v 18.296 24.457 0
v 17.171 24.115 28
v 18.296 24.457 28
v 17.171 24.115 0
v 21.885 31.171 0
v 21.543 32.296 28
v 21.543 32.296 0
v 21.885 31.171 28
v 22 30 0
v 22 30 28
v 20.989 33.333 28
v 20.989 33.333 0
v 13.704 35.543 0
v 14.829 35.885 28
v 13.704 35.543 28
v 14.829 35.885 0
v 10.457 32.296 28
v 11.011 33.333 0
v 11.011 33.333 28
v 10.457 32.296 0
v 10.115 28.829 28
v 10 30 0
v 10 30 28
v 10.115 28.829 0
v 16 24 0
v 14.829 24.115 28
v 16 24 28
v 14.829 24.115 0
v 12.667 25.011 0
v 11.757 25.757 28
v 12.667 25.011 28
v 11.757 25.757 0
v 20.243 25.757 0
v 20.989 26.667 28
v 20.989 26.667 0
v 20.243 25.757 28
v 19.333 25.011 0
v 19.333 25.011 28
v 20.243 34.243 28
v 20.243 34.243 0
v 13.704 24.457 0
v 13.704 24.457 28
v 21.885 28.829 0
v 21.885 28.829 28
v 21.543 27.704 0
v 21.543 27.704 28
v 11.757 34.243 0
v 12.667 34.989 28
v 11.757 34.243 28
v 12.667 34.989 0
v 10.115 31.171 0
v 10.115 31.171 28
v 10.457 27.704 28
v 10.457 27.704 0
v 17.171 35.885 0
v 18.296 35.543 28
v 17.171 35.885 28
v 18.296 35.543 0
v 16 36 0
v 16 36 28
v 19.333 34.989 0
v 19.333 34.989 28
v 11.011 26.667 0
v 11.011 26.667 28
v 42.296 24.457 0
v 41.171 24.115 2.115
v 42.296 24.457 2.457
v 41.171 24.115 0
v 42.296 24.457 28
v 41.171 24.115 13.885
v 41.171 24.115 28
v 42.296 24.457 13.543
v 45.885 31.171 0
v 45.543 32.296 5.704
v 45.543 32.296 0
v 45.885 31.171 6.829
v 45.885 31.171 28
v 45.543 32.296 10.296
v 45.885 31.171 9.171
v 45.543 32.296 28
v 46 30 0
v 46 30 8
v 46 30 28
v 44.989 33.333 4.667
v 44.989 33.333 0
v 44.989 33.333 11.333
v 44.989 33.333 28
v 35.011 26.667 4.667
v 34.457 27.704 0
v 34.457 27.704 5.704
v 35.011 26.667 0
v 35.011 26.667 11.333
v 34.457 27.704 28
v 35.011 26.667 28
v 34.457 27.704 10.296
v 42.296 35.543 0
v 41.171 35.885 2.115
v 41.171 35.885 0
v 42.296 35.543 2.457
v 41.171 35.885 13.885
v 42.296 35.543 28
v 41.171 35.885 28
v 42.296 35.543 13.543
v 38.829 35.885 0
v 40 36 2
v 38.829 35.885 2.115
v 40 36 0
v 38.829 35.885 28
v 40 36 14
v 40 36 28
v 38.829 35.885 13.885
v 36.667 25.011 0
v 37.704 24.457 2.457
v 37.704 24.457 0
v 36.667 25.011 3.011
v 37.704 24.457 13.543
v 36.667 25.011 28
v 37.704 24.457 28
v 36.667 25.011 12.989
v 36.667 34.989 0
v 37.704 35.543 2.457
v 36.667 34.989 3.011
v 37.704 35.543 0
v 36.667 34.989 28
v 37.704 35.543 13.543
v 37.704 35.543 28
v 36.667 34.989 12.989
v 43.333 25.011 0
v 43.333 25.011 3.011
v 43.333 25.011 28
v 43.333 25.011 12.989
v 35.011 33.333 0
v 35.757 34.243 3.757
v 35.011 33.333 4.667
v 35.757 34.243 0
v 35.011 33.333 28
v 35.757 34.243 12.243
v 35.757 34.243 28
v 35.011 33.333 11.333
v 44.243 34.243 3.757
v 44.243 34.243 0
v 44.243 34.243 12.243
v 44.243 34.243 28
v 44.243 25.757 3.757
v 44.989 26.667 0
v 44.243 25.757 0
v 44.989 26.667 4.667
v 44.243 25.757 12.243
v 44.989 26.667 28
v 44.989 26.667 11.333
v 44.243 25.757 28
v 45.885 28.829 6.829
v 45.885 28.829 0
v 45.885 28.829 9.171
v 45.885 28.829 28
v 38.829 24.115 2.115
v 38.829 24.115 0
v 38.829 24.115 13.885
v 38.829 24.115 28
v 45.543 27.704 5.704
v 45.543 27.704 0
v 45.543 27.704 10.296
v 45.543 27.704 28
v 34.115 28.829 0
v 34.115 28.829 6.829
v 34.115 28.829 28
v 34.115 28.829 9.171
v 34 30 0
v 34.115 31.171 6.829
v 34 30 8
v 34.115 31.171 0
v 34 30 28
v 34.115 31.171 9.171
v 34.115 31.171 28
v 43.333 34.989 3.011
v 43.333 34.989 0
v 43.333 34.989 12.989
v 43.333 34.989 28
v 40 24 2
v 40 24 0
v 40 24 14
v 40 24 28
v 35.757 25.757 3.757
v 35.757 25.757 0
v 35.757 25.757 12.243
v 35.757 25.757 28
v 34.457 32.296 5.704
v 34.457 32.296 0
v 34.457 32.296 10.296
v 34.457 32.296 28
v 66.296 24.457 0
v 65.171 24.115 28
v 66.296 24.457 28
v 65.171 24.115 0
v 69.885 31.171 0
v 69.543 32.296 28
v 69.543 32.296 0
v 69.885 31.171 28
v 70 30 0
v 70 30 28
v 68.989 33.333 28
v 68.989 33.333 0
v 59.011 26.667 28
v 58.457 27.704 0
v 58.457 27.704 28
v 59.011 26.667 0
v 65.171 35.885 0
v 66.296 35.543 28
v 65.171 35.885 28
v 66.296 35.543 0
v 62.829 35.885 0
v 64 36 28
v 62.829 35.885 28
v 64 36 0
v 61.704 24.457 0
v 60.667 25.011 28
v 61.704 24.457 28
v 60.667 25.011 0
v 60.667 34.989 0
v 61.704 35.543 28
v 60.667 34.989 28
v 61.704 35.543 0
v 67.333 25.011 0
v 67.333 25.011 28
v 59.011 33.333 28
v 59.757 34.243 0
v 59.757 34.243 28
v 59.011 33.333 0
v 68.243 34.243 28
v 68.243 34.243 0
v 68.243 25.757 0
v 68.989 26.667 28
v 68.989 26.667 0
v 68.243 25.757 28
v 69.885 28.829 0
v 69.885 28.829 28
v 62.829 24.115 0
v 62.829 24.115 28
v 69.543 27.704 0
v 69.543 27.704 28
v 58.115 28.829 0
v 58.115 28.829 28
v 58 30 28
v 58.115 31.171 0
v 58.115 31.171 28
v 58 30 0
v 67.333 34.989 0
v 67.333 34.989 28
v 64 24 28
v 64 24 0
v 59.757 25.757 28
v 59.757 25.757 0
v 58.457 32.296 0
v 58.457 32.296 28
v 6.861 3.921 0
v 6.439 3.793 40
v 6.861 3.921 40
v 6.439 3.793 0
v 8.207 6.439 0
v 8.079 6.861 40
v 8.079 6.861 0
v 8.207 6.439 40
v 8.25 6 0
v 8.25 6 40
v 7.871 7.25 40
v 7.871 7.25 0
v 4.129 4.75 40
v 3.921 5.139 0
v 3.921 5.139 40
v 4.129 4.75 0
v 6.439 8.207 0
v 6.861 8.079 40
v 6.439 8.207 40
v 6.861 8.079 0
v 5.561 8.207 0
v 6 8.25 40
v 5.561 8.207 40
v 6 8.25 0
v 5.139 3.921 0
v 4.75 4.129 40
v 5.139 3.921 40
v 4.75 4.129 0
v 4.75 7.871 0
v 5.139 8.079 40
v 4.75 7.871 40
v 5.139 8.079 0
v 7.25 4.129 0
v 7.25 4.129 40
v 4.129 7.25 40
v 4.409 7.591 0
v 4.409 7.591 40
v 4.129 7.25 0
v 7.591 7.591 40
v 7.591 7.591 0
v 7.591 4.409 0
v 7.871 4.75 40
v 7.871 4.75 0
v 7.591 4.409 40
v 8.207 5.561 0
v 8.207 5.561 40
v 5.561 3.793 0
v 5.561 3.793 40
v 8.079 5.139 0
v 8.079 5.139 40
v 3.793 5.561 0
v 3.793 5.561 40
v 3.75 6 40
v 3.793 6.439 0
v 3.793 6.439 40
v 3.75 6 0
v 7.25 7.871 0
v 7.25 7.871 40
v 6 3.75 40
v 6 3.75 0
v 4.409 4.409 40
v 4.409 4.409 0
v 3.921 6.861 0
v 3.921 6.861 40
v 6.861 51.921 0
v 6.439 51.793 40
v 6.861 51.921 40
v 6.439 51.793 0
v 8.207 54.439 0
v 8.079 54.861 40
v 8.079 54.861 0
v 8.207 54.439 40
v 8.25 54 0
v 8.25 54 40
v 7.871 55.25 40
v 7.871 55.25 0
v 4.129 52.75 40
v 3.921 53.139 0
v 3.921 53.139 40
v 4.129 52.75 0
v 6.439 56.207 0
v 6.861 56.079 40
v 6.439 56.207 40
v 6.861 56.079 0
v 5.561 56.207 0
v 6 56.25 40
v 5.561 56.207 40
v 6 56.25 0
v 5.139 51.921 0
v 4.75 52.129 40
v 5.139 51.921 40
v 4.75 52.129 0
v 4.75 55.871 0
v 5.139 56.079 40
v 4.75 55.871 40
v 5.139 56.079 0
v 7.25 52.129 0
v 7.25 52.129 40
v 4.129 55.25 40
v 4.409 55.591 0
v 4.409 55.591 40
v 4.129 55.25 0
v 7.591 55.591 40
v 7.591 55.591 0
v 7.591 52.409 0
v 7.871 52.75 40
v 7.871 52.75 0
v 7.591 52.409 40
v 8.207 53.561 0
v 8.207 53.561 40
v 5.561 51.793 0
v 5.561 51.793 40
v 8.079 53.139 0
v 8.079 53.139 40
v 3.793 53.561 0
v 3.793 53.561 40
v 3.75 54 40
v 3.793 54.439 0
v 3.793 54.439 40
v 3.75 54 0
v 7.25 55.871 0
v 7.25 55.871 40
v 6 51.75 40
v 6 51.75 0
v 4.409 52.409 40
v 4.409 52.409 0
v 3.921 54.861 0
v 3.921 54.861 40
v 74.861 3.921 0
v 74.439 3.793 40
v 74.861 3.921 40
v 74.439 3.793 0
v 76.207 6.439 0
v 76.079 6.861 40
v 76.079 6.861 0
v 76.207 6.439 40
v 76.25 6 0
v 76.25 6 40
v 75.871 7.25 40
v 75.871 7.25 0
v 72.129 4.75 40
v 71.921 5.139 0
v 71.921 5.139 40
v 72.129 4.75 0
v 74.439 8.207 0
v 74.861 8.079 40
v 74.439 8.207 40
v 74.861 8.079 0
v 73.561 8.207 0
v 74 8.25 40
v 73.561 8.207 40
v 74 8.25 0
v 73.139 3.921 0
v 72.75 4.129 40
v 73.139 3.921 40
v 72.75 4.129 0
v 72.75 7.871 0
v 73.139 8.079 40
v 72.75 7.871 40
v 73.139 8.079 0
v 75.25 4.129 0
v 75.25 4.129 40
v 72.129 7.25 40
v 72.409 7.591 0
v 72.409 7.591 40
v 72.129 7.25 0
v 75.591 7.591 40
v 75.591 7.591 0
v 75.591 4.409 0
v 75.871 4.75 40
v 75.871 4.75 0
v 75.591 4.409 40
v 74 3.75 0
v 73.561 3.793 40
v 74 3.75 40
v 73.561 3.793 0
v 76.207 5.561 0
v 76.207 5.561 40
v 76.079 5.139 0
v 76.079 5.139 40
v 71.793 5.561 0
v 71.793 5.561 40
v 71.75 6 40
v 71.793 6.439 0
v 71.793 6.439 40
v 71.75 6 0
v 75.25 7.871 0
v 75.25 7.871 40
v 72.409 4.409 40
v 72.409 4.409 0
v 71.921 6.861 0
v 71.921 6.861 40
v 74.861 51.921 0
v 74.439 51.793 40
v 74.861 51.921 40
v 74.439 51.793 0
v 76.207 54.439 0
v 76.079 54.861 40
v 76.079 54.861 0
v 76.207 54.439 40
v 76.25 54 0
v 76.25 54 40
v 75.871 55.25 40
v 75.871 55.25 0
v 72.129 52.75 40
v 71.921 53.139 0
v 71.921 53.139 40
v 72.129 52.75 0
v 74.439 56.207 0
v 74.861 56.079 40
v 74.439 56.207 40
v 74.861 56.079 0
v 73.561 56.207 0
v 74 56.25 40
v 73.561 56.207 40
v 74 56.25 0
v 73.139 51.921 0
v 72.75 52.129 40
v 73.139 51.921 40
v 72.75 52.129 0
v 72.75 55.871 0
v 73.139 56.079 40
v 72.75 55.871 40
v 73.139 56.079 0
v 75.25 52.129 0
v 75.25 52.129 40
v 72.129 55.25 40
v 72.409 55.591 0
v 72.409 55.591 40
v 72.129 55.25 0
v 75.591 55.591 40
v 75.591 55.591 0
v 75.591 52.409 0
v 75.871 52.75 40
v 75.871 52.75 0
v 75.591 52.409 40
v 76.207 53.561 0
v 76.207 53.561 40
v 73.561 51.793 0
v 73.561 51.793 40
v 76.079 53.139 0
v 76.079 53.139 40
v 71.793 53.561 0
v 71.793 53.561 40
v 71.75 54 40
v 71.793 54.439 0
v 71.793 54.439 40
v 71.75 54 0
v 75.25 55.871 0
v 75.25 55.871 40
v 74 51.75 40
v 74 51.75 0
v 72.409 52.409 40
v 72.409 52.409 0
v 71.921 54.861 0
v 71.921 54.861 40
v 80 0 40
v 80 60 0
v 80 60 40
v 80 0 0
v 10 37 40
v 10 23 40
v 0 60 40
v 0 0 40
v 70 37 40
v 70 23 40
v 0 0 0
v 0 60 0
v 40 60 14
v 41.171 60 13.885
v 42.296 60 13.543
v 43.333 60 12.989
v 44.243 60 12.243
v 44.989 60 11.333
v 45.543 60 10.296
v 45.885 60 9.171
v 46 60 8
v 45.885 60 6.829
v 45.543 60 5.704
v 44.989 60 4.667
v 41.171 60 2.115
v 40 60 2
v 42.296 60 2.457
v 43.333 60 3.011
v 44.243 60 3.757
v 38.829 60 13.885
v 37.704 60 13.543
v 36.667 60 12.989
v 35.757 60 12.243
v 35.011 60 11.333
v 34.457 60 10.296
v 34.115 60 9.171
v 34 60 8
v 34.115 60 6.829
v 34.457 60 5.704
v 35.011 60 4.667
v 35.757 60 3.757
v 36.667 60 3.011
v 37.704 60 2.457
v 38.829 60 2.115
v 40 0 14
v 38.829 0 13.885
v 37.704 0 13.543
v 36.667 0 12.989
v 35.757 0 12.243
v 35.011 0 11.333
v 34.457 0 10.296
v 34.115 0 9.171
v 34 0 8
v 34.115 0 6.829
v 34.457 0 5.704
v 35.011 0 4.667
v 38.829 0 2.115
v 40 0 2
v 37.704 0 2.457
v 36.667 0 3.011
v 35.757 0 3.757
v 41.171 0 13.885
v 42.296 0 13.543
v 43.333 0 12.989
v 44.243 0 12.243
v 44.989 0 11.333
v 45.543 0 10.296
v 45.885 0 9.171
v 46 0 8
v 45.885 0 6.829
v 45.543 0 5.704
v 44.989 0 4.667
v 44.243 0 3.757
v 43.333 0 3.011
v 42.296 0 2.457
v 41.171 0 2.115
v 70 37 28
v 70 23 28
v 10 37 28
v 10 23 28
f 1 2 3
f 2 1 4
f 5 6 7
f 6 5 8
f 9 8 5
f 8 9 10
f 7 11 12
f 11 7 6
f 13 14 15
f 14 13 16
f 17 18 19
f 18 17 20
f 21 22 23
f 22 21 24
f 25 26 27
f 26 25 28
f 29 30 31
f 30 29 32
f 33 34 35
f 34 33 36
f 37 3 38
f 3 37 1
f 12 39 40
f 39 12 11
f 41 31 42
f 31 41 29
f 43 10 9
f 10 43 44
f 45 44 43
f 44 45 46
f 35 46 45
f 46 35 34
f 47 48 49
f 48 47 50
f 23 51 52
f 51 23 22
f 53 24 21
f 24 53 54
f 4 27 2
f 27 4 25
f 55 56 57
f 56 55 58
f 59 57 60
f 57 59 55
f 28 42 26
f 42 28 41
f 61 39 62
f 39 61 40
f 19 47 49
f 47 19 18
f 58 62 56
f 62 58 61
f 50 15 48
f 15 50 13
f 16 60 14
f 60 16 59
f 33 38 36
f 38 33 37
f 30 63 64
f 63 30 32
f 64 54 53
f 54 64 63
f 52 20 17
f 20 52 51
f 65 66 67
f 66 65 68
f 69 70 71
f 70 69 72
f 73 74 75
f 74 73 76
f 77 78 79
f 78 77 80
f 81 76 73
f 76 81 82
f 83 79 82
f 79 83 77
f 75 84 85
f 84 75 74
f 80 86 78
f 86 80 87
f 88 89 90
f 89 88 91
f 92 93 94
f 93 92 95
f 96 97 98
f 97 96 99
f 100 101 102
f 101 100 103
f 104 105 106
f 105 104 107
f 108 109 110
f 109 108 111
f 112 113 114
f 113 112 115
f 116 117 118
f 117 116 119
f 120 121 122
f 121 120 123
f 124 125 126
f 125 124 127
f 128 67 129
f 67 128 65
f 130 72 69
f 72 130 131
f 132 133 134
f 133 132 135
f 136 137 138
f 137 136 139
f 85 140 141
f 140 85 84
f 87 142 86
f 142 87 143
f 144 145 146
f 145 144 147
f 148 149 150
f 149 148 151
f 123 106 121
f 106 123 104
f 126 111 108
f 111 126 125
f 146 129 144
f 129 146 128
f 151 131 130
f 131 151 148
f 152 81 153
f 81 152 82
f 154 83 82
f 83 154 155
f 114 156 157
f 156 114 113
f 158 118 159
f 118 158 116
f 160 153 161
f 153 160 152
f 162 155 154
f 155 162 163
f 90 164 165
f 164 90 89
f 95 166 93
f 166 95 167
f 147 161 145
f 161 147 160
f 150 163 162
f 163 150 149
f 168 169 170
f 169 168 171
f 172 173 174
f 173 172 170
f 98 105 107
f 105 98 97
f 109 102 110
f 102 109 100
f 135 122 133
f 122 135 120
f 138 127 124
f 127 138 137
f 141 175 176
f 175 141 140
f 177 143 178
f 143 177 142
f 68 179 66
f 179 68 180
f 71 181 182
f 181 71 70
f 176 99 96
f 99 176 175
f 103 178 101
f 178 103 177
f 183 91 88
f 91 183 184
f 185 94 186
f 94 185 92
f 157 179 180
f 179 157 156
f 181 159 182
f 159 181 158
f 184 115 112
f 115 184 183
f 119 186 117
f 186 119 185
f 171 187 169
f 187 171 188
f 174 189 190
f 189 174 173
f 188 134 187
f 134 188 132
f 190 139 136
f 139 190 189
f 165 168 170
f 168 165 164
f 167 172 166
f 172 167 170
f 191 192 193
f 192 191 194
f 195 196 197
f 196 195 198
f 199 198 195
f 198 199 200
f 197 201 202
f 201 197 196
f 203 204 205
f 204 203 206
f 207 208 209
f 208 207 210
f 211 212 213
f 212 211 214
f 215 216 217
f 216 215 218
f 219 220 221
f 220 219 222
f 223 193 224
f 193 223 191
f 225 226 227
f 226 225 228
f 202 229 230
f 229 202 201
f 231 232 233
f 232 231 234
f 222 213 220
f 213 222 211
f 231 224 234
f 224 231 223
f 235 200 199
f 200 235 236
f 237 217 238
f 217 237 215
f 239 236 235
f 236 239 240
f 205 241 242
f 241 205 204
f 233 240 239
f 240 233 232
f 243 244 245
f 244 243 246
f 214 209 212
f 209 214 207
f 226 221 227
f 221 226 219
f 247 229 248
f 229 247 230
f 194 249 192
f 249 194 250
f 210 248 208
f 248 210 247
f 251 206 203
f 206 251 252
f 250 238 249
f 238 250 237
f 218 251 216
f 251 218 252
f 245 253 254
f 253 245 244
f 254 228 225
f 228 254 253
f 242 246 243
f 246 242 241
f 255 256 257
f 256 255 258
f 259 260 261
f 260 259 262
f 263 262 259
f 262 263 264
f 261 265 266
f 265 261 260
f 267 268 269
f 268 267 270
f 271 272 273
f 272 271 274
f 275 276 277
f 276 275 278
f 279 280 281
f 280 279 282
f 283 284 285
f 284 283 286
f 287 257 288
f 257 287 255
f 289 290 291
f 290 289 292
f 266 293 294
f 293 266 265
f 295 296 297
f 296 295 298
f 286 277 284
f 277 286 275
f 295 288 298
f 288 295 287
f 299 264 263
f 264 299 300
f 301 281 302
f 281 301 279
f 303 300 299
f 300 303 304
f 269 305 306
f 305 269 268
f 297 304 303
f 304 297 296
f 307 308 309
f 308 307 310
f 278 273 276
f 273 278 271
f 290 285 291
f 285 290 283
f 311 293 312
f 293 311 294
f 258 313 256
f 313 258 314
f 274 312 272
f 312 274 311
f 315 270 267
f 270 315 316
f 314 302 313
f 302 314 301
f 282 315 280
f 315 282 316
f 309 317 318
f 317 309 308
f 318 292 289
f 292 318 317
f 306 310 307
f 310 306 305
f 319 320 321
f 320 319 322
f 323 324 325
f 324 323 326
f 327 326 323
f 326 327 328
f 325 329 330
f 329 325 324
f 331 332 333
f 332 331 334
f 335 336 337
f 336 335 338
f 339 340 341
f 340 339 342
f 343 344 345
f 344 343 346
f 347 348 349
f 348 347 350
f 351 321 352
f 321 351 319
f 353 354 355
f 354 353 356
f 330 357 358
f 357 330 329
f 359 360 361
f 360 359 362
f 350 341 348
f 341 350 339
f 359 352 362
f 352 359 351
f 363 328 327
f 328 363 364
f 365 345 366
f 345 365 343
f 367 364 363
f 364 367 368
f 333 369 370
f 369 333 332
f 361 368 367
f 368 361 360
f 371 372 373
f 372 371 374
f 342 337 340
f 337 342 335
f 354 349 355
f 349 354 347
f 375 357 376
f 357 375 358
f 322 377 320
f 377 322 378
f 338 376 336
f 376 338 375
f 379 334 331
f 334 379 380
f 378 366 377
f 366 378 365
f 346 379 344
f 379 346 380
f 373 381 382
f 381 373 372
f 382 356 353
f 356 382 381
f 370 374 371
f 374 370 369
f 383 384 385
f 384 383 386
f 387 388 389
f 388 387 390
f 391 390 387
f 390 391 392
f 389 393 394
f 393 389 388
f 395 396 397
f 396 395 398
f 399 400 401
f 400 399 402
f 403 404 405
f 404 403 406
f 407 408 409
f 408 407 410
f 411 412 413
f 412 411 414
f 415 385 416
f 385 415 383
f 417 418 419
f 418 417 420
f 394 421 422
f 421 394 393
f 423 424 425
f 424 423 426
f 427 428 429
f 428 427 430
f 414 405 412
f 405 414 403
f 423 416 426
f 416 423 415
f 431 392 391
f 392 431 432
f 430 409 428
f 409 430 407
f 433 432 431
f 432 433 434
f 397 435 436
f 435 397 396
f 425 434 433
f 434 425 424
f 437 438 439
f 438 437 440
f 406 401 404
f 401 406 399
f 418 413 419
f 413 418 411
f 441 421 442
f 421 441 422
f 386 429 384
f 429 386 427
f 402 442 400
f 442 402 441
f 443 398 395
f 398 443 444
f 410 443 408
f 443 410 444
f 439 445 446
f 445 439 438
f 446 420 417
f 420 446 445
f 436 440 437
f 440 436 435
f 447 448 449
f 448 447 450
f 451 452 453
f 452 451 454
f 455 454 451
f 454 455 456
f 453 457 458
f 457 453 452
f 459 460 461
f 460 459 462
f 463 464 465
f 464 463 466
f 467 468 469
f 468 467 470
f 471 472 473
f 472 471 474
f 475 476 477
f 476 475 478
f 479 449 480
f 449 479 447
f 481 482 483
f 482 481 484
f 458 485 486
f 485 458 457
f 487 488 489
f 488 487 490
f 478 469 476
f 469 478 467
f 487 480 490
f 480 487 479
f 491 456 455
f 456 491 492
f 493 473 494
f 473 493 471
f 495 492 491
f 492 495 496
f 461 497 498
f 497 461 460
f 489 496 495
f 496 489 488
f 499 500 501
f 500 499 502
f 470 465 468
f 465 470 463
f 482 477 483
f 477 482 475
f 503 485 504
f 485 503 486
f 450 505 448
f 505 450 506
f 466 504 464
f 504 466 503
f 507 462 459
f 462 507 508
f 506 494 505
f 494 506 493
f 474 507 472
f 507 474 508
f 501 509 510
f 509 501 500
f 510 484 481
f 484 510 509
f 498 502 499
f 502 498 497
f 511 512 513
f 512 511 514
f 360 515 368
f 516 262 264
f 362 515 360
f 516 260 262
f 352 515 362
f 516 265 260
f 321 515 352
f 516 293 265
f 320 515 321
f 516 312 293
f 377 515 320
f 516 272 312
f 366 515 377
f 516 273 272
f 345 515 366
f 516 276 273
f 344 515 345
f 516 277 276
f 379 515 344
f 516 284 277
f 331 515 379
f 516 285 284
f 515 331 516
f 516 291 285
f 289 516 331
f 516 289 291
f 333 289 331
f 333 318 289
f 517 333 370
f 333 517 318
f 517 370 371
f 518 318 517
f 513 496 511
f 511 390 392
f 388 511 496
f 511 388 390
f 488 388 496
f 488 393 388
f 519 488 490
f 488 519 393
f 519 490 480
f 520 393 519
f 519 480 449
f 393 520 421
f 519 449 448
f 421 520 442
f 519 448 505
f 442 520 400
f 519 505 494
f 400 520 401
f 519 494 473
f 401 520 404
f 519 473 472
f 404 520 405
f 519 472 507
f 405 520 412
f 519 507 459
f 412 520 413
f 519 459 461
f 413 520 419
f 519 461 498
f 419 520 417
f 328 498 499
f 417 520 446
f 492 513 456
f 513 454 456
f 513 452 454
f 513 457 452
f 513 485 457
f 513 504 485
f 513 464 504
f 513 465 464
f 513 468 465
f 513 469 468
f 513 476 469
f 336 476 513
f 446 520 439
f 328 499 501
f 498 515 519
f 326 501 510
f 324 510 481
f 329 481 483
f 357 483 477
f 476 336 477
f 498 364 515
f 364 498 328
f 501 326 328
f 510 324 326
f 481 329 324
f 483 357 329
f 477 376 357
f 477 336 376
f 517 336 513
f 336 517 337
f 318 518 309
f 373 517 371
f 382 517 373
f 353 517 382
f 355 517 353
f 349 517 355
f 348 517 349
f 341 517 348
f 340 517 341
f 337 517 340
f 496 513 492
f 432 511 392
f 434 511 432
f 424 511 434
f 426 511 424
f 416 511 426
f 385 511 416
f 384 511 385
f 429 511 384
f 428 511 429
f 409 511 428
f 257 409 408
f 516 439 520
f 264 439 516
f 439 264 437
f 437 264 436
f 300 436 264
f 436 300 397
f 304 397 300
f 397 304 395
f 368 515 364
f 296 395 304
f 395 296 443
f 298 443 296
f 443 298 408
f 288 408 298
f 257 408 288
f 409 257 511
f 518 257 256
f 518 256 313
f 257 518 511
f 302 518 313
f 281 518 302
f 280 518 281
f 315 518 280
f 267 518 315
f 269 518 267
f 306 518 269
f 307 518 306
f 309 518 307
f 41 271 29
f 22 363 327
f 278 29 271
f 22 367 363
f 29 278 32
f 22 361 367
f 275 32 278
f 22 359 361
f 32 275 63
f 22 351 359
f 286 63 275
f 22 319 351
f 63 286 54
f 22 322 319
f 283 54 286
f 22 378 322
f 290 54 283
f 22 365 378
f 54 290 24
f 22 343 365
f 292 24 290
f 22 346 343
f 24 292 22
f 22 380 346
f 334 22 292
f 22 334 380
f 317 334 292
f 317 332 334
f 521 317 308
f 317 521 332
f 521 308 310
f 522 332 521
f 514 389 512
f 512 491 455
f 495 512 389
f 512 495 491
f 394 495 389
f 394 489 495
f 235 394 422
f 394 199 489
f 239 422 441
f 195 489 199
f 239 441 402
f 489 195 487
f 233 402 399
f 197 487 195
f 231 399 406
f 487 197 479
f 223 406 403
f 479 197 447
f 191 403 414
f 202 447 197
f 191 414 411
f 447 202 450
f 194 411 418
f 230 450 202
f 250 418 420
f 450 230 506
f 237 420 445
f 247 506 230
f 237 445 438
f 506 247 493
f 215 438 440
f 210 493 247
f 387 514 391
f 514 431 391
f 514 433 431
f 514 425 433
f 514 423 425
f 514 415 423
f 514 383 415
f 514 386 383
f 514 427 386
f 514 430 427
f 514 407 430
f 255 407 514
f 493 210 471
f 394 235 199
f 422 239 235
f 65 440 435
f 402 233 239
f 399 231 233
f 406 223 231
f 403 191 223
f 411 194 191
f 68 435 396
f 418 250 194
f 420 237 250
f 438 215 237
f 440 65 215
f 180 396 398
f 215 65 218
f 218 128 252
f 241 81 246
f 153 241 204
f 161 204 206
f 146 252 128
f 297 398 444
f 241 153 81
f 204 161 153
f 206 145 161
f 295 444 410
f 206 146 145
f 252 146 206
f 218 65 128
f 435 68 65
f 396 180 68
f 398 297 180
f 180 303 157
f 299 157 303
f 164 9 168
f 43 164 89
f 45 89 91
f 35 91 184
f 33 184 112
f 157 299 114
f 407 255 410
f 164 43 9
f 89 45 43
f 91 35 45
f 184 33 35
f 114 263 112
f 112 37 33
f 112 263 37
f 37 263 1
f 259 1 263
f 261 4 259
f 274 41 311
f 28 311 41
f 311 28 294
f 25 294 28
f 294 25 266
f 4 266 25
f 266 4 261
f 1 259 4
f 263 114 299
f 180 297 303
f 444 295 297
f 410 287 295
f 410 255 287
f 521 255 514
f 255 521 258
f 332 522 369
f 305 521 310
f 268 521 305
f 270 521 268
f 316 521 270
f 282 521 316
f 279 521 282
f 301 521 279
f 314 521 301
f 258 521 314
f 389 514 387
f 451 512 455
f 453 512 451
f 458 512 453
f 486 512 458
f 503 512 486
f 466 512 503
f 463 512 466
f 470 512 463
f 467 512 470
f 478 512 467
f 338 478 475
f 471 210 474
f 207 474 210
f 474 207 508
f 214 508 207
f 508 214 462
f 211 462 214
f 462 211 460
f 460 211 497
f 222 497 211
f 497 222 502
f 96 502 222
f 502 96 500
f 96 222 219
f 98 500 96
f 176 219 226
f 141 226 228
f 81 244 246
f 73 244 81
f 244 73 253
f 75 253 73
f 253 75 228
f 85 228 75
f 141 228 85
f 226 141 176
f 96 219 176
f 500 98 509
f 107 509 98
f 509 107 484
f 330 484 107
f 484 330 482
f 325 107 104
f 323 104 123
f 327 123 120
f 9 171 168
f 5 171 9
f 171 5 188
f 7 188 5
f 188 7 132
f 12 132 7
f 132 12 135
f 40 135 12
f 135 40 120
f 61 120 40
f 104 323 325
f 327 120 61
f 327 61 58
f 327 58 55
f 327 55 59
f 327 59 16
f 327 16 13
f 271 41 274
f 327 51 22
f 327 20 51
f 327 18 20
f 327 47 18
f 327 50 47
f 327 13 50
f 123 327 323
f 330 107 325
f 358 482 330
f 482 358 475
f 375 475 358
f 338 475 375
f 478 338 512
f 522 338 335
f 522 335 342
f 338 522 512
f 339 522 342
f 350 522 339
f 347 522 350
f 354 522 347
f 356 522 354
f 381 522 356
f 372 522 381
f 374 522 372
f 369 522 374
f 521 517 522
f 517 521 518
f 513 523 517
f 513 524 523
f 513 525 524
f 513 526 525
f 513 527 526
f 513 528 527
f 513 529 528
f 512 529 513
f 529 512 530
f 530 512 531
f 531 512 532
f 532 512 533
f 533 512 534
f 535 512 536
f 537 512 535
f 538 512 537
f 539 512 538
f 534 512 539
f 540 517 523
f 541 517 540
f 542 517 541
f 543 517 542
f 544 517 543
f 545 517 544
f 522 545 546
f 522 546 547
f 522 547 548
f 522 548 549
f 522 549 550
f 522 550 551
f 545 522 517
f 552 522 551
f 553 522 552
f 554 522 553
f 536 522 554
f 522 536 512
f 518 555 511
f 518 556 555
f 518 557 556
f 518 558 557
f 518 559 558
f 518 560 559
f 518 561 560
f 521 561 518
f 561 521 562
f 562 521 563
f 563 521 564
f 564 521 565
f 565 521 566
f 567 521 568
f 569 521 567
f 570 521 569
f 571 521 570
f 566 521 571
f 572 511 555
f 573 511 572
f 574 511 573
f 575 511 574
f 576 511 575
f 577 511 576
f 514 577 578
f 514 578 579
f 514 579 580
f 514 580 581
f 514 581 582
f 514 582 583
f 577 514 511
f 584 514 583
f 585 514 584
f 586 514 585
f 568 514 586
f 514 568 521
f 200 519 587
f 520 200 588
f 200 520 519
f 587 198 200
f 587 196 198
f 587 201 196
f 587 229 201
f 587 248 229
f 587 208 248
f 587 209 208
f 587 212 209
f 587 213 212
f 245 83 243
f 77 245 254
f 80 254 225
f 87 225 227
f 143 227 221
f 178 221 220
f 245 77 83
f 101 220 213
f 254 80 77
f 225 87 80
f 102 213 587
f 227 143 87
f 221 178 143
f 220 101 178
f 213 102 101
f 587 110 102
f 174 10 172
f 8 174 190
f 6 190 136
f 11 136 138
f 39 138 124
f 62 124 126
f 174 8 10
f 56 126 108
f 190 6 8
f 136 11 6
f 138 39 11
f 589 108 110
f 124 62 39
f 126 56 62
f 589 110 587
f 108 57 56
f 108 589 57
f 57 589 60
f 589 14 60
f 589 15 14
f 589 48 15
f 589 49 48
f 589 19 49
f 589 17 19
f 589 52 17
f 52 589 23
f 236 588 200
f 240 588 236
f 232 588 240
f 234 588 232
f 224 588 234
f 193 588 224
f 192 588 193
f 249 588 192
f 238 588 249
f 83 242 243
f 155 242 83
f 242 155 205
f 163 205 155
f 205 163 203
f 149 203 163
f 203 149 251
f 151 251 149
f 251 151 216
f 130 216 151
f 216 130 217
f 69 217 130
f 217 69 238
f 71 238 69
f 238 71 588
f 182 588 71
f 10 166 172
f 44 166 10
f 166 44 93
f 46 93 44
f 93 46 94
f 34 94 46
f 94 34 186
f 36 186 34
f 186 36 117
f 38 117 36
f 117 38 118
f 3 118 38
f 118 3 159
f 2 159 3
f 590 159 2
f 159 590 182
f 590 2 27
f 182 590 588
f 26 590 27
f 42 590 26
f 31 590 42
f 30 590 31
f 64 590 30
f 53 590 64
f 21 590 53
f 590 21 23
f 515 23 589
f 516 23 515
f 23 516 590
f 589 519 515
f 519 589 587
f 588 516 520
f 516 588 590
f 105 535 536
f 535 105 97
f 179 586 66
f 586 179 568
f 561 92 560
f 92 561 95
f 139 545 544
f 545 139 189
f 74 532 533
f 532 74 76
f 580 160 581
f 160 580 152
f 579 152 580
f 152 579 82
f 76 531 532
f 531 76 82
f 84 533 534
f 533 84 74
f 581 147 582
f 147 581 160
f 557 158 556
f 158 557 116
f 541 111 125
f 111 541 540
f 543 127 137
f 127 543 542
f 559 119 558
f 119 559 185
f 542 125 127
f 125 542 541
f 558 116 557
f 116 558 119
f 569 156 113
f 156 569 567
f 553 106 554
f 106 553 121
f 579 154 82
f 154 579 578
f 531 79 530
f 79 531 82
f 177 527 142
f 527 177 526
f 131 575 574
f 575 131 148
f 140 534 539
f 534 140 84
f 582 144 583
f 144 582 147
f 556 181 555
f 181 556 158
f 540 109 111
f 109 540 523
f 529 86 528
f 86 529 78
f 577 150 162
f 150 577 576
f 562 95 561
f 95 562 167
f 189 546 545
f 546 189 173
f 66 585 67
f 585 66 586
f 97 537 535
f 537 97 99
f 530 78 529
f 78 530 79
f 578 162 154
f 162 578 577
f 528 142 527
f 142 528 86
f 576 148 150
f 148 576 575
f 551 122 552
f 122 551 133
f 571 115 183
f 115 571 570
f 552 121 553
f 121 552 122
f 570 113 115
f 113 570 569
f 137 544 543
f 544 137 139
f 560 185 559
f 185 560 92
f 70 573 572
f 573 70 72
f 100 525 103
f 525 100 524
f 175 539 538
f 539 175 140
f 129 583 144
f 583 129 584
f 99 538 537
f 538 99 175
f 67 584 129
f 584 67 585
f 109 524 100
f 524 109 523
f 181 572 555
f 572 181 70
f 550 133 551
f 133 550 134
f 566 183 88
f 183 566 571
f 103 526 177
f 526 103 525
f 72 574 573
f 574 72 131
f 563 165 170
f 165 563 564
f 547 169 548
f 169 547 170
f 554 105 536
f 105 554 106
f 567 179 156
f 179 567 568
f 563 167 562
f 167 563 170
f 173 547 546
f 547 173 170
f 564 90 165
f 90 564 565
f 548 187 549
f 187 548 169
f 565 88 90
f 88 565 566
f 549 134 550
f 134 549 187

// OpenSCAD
$fn = 32;

// ----------------------------------------------------------------------
// Manifold block: side_outlet manifold
// ----------------------------------------------------------------------

// --- parameters (mm) ---
block_l = 80;             // block length, X
block_w = 60;             // block width, Y
block_h = 40;             // block height, Z
port_d = 12;              // port bore diameter
port_pitch = 24;          // port pitch along X
gallery_d = 14;           // top gallery width, Y
gallery_depth = 12;       // gallery pocket depth
wall_p = 10;              // gallery end wall thickness, X
mnt_d = 4.5;              // mounting hole diameter
mnt_in = 6;               // mounting hole inset from the edges
out_d = 12;               // outlet bore diameter
out_z = 8;                // outlet axis height
fit_tol = 0.02;           // tolerance for press fits, mm
free_tol = 0.2;           // tolerance for clearance fits, mm

n_ports = 3;  // ports in the row
port_x0 = (block_l - (n_ports - 1) * port_pitch) / 2;  // first port X

difference() {
  cube([block_l, block_w, block_h]);
  for (i = [0 : n_ports - 1])
    translate([port_x0 + i * port_pitch, block_w / 2, -1])
      cylinder(h = block_h + 2, d = port_d);
  translate([wall_p, block_w / 2 - gallery_d / 2, block_h - gallery_depth])
    cube([block_l - 2 * wall_p, gallery_d, gallery_depth + 1]);
  for (cx = [mnt_in, block_l - mnt_in])
    for (cy = [mnt_in, block_w - mnt_in])
      translate([cx, cy, -1]) cylinder(h = block_h + 2, d = mnt_d);
  translate([block_l / 2, -1, out_z]) rotate([-90, 0, 0])
    cylinder(h = block_w + 2, d = out_d);
}
